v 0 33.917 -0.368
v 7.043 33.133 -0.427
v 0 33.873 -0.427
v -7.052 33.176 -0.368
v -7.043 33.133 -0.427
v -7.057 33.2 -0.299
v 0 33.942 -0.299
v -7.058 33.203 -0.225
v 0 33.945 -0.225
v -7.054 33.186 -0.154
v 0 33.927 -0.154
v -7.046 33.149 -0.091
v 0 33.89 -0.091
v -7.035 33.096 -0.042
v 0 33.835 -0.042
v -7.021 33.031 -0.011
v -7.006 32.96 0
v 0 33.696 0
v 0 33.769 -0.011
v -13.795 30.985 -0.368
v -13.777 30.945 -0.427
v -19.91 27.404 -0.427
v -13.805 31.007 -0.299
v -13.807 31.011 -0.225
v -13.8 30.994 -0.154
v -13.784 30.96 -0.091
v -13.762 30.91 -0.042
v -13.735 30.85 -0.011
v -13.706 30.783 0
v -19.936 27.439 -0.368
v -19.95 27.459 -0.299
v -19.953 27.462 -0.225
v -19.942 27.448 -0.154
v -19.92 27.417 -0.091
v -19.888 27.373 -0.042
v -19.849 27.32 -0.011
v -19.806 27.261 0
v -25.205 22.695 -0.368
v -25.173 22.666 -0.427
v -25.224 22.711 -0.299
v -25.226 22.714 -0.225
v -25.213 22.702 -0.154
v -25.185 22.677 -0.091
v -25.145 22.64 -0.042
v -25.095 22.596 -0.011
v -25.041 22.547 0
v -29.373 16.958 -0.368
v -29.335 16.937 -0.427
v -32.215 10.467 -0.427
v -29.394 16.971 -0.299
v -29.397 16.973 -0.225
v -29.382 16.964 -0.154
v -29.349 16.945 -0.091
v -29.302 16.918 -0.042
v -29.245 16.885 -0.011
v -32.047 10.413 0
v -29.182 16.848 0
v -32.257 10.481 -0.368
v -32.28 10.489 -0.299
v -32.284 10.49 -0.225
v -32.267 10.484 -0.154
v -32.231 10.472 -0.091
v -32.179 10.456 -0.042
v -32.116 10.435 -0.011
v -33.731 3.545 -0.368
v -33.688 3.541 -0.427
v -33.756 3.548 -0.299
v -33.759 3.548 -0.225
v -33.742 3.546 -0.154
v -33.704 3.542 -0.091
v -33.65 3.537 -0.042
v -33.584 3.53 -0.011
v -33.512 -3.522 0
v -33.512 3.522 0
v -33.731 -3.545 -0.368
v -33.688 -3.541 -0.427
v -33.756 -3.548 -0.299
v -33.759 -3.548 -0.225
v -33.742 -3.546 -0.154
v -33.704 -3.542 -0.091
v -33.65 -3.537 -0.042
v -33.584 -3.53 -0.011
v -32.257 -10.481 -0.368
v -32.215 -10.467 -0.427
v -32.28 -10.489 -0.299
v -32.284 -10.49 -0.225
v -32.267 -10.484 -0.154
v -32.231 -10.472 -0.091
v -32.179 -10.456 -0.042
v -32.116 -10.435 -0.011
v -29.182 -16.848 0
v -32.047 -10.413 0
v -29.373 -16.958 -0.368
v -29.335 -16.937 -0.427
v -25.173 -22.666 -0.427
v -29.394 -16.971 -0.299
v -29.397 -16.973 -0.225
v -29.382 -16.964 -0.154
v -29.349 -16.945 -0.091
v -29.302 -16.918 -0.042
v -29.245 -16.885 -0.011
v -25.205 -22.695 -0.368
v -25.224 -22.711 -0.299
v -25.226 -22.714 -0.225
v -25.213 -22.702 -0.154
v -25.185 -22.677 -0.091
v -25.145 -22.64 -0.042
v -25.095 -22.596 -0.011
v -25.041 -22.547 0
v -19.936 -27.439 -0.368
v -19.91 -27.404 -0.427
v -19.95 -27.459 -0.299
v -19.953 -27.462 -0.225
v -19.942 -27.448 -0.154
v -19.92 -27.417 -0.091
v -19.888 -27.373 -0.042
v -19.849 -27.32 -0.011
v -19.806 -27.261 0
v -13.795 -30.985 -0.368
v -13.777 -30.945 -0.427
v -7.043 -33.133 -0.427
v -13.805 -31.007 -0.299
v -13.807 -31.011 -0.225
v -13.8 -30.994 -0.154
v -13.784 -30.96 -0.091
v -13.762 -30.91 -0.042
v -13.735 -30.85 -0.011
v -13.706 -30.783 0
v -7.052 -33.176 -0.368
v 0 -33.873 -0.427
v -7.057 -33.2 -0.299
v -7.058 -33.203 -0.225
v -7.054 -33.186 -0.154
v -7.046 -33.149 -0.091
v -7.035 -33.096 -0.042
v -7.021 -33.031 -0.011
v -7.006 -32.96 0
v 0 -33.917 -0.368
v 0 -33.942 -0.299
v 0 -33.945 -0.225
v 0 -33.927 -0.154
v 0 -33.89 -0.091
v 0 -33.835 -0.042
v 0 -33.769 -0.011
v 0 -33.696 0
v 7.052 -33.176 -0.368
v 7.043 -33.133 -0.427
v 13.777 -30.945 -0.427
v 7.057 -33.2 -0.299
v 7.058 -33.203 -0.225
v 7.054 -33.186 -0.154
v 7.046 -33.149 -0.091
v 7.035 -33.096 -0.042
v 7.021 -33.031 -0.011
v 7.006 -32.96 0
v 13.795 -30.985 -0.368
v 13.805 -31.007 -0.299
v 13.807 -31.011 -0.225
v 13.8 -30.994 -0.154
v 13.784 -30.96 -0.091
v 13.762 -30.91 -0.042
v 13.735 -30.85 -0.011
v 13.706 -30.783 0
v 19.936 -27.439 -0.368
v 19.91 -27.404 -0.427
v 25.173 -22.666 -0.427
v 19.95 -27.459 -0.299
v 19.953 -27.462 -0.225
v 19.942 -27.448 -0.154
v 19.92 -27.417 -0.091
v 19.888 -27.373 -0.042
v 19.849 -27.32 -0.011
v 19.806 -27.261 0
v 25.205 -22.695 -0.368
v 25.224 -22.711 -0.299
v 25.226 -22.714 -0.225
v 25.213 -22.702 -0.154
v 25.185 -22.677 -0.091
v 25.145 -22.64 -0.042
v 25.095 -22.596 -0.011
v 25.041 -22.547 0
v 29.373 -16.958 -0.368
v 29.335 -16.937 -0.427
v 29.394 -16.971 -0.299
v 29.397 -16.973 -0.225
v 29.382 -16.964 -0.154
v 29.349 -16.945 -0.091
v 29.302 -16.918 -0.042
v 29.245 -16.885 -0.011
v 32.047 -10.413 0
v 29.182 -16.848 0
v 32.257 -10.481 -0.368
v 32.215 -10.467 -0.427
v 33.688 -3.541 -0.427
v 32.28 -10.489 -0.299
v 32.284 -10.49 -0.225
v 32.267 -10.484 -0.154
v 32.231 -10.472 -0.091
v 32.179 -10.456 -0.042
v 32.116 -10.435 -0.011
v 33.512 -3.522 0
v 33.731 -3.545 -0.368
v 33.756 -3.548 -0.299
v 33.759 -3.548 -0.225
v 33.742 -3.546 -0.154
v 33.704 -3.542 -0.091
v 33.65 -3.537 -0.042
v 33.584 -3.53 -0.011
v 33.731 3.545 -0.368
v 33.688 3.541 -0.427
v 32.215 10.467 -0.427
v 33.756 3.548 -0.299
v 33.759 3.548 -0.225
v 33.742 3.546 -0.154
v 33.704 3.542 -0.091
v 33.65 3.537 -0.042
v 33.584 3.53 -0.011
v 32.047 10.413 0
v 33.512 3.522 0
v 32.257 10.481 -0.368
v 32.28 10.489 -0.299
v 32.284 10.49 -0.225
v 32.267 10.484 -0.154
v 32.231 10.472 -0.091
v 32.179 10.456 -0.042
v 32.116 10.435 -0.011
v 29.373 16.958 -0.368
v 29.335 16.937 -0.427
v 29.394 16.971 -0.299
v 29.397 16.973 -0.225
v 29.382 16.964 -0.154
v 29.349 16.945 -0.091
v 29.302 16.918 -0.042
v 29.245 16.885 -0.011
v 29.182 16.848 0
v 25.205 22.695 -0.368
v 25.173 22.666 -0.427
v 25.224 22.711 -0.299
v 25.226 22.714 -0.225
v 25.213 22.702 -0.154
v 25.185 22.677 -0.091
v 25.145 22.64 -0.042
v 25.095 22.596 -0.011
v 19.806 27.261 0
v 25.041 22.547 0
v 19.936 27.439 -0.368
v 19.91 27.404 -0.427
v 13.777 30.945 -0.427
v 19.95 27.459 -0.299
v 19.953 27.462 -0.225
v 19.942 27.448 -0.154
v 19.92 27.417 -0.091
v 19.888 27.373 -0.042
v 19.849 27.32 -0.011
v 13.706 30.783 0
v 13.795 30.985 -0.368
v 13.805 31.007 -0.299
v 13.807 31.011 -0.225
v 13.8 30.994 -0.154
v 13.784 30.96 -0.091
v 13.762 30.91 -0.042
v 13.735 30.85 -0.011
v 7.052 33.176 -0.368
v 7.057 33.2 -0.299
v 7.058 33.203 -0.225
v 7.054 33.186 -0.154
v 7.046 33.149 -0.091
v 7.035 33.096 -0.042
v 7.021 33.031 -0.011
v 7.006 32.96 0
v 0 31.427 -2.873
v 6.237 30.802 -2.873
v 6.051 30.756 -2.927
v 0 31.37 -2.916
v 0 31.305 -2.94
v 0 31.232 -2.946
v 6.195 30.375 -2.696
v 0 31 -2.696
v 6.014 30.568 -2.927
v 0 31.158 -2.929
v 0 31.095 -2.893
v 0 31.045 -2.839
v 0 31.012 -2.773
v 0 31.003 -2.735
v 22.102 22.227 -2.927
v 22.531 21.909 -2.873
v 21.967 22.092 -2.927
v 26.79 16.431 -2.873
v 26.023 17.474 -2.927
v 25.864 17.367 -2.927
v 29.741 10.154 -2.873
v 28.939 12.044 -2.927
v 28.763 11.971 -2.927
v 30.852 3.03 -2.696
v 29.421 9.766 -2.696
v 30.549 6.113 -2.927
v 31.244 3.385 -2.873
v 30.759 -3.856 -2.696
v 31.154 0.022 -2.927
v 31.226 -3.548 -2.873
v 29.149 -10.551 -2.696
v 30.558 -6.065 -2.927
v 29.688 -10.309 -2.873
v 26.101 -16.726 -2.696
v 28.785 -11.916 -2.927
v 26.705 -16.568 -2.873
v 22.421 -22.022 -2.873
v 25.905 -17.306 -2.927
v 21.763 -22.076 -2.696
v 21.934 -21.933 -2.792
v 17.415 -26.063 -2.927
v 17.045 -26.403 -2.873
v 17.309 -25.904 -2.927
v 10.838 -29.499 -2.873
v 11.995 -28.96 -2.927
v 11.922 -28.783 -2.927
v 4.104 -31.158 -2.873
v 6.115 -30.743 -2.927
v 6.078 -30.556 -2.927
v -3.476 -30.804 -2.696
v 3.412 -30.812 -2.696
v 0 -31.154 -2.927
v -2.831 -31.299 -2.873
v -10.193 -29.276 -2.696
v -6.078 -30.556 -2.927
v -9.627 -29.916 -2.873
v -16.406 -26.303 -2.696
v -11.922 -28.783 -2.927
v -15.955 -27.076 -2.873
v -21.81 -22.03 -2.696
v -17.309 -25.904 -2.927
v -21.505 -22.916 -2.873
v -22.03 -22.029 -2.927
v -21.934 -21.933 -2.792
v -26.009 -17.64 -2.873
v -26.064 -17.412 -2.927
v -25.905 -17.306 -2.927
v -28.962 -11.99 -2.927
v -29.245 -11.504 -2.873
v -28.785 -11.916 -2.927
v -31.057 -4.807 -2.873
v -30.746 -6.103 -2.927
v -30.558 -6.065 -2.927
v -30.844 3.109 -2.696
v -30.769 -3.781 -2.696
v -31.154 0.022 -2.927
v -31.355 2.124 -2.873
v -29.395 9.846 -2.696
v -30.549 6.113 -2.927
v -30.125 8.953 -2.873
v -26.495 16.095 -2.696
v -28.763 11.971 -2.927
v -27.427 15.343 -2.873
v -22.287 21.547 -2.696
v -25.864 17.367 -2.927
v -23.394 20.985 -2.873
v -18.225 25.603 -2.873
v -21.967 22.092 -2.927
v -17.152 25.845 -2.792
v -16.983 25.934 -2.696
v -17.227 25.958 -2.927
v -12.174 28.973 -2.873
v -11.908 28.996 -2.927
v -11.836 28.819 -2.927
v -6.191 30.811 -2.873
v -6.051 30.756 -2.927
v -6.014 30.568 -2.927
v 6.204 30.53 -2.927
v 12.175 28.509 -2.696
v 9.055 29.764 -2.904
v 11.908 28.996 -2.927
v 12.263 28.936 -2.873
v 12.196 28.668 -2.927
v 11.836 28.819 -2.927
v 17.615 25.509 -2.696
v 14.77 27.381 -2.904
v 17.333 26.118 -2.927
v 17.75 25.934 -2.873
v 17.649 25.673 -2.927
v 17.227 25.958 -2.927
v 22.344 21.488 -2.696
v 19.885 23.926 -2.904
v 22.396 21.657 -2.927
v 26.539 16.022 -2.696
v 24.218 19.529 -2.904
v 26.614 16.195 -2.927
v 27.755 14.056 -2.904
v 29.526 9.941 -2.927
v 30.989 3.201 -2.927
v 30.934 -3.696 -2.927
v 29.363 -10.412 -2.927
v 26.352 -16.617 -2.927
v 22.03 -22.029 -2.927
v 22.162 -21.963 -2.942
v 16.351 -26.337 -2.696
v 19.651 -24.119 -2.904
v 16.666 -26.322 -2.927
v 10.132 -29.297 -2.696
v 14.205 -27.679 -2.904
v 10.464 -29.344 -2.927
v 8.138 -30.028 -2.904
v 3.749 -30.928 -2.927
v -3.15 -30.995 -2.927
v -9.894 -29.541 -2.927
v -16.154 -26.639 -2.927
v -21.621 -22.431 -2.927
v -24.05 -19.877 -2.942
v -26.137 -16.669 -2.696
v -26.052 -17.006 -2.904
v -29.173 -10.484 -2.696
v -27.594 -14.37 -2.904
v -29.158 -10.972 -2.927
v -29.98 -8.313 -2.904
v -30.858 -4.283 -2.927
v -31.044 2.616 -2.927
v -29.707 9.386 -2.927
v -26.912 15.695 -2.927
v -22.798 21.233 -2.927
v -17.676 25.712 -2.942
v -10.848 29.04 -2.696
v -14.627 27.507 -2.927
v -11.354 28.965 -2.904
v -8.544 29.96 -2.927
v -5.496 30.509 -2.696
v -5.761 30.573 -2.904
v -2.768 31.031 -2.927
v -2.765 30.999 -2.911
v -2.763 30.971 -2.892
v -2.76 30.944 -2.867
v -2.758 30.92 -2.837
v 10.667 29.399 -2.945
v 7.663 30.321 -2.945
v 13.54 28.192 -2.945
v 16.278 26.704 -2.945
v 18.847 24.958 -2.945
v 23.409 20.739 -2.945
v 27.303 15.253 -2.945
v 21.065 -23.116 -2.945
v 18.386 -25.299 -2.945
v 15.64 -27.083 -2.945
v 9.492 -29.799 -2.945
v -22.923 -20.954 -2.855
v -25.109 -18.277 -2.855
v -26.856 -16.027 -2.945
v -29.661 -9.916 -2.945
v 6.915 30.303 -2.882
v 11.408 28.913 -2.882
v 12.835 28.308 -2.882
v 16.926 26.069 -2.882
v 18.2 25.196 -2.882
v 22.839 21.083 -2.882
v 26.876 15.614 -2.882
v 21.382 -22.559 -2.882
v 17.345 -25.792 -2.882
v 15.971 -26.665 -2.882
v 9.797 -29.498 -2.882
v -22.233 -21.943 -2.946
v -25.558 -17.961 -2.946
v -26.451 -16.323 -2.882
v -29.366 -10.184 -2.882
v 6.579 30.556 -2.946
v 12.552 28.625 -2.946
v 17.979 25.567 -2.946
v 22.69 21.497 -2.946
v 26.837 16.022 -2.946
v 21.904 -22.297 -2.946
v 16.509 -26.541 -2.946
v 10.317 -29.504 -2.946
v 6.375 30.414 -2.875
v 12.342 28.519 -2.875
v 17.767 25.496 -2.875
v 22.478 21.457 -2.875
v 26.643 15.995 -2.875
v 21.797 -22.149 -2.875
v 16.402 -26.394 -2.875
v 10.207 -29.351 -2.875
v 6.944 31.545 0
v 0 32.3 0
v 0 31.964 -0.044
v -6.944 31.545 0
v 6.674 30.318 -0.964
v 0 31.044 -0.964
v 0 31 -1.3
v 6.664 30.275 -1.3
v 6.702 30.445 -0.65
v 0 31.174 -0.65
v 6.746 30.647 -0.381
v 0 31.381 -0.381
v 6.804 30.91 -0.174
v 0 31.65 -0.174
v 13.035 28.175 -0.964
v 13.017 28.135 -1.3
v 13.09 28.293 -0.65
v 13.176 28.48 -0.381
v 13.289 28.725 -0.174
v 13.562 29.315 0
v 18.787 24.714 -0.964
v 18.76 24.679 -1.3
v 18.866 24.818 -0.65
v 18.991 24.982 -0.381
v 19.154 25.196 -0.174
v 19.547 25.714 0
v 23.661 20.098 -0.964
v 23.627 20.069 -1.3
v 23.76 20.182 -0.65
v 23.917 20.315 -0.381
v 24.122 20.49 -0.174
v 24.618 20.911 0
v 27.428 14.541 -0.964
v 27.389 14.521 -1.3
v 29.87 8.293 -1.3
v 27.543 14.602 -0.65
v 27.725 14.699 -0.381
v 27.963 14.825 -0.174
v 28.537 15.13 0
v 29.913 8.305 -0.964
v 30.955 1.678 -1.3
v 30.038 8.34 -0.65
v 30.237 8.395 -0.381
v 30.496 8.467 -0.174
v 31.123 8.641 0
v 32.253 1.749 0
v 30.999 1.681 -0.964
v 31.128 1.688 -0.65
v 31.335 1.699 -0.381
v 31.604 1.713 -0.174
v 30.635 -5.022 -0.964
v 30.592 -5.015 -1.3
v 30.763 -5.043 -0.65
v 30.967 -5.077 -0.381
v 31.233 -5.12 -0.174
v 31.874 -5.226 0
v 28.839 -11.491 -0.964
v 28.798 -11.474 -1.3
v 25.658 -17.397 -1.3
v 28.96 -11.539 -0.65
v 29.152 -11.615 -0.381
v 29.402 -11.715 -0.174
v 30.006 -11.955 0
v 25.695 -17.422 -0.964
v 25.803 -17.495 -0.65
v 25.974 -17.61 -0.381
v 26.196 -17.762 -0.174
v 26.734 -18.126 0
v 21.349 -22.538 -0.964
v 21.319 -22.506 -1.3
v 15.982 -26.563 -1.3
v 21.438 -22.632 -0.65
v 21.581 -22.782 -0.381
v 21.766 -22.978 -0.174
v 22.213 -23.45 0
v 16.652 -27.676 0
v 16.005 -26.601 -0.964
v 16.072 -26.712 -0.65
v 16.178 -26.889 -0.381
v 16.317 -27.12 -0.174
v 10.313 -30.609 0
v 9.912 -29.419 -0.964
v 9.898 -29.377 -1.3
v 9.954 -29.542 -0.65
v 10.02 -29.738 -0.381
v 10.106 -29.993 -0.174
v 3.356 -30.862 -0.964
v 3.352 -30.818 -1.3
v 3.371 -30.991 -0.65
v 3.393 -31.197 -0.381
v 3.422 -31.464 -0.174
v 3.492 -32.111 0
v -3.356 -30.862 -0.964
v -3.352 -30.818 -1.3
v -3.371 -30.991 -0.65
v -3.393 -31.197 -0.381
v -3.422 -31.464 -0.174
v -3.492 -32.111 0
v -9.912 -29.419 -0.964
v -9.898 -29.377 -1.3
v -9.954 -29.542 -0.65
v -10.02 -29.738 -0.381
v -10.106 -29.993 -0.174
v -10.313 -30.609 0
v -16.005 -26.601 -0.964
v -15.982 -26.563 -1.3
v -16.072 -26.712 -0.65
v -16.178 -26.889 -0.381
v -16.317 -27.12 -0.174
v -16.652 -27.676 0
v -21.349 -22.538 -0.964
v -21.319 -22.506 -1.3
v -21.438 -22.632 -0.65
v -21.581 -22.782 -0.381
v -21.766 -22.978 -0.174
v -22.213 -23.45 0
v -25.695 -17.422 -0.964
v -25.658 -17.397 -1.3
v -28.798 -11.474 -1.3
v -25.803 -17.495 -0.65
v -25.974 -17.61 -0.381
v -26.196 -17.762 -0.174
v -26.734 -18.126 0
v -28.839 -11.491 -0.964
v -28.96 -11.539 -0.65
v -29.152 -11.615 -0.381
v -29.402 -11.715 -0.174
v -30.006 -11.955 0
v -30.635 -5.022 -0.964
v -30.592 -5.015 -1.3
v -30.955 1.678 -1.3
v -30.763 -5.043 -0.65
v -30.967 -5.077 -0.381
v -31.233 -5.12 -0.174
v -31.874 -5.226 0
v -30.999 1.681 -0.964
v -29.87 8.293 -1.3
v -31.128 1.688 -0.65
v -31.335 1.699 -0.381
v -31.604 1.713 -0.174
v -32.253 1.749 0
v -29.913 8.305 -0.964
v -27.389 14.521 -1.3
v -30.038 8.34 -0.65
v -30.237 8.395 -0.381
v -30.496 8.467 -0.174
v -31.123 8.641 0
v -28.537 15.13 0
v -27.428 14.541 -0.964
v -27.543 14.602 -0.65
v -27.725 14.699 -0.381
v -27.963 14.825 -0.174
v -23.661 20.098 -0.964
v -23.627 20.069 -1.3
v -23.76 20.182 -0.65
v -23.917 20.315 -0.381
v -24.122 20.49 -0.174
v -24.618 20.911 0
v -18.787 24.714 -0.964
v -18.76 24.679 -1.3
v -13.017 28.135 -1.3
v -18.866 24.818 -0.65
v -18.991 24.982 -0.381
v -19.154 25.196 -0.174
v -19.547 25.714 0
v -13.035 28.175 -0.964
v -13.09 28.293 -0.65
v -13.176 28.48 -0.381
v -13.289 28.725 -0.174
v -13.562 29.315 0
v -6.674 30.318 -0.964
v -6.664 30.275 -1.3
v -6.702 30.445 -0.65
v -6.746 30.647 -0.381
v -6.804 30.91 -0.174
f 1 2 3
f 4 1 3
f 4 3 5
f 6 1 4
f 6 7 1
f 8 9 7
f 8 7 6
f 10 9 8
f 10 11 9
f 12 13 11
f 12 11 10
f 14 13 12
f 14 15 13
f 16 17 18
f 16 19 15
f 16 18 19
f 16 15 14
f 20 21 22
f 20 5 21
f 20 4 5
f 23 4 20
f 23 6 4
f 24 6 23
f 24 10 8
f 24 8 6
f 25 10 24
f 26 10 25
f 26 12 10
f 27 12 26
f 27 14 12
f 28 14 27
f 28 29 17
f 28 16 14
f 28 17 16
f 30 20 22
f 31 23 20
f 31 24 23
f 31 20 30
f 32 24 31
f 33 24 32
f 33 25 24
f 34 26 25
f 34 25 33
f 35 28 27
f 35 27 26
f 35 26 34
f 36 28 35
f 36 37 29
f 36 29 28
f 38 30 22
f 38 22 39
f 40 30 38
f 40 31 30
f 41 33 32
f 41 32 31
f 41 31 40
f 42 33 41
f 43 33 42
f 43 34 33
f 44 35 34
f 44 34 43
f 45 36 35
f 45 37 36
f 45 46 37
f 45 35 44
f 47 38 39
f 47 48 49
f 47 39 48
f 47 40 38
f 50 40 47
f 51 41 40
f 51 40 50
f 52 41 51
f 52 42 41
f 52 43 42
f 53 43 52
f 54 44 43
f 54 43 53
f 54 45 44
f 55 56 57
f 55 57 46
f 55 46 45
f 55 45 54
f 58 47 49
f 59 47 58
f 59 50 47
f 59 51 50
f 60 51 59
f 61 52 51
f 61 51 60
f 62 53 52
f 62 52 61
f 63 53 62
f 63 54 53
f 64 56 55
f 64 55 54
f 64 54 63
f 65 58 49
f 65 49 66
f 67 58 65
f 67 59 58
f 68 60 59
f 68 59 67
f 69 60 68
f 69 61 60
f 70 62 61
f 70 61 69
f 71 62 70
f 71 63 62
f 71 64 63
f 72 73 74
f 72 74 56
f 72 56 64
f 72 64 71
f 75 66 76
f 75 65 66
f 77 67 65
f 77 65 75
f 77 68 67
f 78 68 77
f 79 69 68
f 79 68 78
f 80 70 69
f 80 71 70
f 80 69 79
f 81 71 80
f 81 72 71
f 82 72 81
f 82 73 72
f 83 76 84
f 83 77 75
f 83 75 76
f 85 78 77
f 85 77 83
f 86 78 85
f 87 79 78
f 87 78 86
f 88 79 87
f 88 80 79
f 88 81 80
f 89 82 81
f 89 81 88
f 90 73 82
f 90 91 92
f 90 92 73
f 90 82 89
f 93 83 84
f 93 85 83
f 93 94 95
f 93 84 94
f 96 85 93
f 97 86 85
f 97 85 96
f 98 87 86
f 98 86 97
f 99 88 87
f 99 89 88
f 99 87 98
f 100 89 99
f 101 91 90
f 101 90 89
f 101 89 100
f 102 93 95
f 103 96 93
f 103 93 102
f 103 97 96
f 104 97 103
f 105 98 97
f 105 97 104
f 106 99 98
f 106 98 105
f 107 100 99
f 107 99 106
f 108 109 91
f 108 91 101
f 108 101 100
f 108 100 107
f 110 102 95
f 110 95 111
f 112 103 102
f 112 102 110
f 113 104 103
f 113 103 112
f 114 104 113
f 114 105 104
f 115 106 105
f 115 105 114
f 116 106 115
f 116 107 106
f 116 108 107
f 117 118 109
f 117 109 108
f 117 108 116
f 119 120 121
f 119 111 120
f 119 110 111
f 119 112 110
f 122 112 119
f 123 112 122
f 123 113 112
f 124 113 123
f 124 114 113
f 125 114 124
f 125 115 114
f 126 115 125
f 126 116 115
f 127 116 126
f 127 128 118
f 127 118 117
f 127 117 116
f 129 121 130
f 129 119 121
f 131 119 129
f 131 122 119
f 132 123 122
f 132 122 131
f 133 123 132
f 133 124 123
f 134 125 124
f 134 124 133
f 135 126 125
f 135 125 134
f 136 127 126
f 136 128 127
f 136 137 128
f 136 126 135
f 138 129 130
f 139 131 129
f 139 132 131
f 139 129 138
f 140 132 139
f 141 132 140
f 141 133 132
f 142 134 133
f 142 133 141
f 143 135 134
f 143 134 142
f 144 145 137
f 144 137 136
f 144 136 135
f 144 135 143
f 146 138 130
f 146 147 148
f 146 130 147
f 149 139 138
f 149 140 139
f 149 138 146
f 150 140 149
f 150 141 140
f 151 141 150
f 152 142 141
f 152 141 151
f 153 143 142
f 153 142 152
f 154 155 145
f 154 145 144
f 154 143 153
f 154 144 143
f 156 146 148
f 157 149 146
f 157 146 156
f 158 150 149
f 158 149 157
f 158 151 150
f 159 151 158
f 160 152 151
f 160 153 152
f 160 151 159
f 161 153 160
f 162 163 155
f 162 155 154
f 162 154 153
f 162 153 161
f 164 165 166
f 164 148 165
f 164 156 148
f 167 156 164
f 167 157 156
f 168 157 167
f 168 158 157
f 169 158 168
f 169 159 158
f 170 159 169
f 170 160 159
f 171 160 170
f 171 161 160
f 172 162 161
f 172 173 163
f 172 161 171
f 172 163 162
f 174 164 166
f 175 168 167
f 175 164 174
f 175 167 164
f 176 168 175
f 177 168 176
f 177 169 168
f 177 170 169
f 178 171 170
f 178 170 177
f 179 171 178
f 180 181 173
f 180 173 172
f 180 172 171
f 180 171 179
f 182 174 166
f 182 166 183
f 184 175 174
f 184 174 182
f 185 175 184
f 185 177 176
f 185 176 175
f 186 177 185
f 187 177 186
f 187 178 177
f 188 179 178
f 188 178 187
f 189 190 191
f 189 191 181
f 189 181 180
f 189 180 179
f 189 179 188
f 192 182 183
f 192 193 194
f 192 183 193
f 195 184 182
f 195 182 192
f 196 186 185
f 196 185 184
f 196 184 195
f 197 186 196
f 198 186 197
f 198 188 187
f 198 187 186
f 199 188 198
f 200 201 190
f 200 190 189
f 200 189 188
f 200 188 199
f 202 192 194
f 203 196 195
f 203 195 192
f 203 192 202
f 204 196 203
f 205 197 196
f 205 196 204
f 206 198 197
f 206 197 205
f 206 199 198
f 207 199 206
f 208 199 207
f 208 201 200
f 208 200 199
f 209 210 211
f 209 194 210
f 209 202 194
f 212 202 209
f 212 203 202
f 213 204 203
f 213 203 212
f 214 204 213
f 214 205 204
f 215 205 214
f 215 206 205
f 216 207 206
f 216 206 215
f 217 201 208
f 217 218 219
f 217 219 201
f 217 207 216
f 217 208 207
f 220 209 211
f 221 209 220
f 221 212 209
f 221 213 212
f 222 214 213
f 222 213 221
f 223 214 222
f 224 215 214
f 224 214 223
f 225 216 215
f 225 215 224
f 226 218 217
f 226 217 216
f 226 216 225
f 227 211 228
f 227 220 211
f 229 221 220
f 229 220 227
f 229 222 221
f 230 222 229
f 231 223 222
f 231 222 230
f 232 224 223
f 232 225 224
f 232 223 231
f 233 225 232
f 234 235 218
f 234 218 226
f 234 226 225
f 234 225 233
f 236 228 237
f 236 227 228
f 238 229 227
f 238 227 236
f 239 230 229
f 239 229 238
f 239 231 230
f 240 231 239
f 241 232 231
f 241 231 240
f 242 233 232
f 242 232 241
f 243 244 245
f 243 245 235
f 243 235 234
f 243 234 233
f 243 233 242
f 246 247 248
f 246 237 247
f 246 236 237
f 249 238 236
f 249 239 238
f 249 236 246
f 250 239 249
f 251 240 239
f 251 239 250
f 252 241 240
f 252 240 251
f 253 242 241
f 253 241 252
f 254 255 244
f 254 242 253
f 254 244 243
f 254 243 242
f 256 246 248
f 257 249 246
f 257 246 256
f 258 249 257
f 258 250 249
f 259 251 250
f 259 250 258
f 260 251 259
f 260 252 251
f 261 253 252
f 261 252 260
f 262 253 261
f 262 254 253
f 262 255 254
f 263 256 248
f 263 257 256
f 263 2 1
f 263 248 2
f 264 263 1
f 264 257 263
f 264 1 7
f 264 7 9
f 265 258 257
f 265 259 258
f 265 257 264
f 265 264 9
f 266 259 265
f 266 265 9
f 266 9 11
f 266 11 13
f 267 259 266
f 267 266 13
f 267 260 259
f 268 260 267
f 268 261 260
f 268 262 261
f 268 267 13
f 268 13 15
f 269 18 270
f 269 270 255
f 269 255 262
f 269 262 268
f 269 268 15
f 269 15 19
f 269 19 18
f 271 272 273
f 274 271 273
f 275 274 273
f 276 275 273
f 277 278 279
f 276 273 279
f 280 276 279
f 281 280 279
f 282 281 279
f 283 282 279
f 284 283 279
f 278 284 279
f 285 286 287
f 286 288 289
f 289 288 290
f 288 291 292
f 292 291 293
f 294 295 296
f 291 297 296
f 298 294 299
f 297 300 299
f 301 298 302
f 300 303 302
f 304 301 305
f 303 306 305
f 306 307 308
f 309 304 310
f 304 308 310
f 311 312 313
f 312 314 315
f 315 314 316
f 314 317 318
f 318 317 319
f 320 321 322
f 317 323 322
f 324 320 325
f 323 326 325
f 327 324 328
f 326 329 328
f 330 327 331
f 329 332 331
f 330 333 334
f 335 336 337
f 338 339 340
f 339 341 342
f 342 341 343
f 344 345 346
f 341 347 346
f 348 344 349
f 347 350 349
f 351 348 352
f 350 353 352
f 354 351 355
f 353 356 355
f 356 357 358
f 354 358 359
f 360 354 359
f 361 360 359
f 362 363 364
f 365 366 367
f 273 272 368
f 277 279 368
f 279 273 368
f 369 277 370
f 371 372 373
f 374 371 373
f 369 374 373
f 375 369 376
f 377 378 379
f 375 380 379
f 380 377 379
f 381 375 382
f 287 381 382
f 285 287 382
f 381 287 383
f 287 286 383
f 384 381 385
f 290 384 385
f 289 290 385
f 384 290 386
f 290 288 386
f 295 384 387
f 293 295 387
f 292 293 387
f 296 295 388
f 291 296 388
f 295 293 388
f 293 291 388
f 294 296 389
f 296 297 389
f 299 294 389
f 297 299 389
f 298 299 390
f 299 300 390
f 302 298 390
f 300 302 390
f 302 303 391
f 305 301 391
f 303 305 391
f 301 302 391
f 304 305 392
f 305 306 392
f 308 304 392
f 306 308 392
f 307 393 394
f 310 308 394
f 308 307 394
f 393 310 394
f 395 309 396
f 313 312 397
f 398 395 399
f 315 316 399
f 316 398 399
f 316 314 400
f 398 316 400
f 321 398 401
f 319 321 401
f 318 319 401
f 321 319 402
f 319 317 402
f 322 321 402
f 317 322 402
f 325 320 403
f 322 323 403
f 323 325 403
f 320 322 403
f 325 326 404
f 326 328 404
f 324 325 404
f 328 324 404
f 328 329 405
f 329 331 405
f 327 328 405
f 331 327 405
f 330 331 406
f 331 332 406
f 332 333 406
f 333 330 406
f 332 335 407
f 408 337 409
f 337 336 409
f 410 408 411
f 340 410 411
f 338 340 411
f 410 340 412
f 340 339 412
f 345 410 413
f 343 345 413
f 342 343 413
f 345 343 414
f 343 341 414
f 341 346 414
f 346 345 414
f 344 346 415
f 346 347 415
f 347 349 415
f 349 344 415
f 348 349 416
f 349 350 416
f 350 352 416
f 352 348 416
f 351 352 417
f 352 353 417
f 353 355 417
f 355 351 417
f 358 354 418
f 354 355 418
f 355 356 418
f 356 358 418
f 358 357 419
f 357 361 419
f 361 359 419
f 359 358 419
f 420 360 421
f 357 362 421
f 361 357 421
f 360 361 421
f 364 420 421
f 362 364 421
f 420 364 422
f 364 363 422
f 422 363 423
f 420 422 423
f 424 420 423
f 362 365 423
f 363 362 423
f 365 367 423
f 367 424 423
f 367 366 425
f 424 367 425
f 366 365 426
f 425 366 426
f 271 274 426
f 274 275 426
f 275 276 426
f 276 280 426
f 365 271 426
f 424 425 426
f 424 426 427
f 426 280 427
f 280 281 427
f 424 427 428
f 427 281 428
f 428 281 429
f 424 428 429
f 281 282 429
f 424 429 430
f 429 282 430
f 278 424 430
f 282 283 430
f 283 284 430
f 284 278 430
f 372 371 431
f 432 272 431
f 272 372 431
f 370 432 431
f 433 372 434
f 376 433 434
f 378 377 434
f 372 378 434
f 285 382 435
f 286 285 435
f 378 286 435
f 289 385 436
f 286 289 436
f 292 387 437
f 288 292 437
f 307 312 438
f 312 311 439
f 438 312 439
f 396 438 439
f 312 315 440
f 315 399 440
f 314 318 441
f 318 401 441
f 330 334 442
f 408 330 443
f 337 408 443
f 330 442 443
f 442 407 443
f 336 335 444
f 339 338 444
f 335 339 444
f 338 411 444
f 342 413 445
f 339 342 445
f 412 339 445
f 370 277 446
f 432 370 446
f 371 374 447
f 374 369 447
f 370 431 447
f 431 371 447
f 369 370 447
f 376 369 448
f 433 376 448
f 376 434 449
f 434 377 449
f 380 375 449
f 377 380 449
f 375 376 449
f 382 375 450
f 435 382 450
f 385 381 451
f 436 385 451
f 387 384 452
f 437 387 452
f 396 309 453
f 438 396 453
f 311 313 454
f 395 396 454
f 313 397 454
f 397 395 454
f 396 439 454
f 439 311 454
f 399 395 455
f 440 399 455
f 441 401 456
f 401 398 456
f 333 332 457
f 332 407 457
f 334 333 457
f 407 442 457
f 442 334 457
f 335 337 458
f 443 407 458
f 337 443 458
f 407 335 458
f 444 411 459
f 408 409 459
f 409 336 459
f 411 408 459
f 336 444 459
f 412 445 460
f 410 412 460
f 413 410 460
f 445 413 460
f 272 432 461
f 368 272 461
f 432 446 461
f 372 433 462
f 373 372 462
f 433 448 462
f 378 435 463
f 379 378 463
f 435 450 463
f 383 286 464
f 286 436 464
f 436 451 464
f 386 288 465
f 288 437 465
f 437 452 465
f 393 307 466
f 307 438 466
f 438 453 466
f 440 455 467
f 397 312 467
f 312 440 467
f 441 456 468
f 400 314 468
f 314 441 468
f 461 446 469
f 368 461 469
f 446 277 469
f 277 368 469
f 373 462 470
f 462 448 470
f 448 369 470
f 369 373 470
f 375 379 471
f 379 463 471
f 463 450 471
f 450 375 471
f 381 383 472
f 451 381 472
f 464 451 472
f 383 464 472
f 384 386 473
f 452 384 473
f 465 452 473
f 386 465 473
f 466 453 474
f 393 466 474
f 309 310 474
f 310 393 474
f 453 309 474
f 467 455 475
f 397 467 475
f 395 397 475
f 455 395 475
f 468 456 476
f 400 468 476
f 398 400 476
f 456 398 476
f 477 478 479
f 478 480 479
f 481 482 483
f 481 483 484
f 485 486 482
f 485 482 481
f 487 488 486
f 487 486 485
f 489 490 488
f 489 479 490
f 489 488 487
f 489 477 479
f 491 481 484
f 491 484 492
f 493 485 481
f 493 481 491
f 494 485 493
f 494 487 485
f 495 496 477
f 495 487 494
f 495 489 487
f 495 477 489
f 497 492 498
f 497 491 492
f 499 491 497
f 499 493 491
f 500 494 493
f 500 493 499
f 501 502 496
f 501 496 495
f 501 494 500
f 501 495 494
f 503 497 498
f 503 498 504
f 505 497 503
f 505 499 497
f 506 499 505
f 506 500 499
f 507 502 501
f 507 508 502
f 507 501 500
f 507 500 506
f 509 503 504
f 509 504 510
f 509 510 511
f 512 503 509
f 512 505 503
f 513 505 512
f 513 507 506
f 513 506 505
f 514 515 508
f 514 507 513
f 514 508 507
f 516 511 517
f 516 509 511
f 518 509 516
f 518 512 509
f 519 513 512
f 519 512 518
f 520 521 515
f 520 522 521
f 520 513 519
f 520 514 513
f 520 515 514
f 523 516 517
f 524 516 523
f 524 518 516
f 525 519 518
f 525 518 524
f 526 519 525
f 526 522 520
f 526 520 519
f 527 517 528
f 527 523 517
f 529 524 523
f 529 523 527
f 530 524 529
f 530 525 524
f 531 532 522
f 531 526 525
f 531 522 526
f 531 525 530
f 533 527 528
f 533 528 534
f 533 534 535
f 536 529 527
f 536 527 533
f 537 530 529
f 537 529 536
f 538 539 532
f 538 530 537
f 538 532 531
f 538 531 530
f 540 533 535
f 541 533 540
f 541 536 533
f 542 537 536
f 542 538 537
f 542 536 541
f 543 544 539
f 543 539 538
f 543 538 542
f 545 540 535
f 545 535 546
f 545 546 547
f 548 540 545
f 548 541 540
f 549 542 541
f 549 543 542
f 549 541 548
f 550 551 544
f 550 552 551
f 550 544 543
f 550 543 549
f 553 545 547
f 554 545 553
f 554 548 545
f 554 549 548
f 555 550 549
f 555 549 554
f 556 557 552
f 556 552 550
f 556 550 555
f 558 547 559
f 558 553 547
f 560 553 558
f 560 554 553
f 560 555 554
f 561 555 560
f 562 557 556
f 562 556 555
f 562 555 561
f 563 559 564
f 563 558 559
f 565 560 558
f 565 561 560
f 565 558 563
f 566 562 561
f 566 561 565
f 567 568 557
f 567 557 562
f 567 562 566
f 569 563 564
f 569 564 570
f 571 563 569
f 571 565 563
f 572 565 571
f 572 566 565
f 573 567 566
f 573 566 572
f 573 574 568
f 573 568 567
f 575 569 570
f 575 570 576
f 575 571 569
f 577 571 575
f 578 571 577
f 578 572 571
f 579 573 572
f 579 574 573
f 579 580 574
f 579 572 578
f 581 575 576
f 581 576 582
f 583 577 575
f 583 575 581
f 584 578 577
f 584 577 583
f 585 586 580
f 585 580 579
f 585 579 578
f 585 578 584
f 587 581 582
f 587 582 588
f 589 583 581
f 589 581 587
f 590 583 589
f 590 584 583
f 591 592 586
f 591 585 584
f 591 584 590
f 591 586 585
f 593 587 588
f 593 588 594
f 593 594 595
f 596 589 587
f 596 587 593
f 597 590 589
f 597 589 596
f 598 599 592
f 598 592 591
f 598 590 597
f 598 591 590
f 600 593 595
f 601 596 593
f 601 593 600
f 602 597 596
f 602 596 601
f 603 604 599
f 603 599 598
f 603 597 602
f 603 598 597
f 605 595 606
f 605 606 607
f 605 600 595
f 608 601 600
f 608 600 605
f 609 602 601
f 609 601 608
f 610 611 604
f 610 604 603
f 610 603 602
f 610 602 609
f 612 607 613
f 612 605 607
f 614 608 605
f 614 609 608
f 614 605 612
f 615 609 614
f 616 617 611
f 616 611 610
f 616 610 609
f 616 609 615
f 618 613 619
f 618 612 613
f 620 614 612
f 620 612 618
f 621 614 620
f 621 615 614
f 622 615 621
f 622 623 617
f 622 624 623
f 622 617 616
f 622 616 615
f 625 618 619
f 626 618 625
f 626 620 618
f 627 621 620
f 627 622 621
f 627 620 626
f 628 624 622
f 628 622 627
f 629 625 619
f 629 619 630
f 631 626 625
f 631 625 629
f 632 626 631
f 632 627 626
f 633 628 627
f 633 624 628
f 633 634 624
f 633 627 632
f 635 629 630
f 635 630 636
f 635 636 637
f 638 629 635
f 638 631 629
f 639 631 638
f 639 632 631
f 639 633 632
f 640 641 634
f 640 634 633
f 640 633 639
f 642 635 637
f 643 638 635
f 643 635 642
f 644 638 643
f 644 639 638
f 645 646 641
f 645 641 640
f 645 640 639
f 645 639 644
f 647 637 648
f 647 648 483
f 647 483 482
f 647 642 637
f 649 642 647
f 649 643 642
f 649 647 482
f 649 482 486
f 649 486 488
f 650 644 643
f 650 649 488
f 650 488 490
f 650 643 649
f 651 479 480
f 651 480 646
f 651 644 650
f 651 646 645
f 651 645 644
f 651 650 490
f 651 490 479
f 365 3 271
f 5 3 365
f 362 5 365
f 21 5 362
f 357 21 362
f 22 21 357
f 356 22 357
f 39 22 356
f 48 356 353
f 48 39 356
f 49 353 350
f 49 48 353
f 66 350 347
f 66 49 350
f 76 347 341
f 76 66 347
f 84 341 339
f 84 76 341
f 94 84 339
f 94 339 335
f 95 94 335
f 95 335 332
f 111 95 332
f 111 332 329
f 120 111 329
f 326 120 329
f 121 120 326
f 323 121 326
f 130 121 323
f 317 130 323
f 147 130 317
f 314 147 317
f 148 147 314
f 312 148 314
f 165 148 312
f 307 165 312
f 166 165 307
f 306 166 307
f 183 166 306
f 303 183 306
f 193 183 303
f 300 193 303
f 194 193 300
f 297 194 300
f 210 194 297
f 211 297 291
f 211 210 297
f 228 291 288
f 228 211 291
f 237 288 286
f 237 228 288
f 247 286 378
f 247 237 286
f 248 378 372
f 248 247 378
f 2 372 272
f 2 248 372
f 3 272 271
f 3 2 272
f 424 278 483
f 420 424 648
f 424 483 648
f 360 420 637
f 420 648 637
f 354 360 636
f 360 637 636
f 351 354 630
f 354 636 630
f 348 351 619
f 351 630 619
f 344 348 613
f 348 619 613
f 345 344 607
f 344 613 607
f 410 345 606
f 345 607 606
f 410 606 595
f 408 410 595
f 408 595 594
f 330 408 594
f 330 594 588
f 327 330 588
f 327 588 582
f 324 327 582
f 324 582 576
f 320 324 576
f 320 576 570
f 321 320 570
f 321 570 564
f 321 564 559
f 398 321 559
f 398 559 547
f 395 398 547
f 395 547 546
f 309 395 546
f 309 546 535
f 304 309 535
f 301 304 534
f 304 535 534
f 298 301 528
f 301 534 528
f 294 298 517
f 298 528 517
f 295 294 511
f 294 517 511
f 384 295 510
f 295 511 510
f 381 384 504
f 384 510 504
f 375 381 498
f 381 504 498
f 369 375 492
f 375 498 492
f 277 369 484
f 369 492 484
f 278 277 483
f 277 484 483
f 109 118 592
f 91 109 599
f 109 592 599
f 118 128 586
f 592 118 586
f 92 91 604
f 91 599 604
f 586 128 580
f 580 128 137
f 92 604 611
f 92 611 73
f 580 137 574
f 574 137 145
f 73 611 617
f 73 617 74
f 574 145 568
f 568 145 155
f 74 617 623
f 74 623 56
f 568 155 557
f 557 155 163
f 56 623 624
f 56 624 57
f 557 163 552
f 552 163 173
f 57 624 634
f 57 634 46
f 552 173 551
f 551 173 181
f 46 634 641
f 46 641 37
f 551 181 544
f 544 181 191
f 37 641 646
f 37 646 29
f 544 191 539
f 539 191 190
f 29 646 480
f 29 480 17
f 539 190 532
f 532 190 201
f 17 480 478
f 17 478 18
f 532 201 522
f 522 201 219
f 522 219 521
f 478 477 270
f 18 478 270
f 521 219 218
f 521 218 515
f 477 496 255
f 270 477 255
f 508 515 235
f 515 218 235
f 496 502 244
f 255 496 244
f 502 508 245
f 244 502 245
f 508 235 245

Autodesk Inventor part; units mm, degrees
ref_plane "YZ Plane" through (0, 0, 0) normal (1, 0, 0) x (0, 1, 0)
ref_plane "XZ Plane" through (0, 0, 0) normal (0, 1, 0) x (-1, 0, 0)
ref_plane "XY Plane" through (0, 0, 0) normal (0, 0, 1) x (1, 0, 0)
sketch "Эскиз1" plane through (0, 0, 0) normal (1, 0, 0) x (0, 1, 0)
  line L0 (-6.86, 0) -> (41.16, 0) construction
  line L1 (0, 0.66) -> (0, -3.96) construction
  line L2 (34.3, 0) -> (31, 0)
  line L3 (31, -3.3) -> (34.3, 0)
  line L4 (31, -3.3) -> (31, 0)
  point P0 (0, 0)
  dimension "d0" = 31
  dimension "d1" = 3.3
  dimension "d2" = 45
revolve "Вращение1" add sketch "Эскиз1" angle 360 about axis through (0, 0, 0) along (0, 0, -1)
fillet "Сопряжение1" radius 1.3 1 edges at (0, -31, 0)
fillet "Сопряжение2" radius 0.25 1 edges at (0, -34.3, 0)
fillet "Сопряжение3" radius 0.25 1 edges at (0, -31, -3.3)
properties part number "кол_062"
